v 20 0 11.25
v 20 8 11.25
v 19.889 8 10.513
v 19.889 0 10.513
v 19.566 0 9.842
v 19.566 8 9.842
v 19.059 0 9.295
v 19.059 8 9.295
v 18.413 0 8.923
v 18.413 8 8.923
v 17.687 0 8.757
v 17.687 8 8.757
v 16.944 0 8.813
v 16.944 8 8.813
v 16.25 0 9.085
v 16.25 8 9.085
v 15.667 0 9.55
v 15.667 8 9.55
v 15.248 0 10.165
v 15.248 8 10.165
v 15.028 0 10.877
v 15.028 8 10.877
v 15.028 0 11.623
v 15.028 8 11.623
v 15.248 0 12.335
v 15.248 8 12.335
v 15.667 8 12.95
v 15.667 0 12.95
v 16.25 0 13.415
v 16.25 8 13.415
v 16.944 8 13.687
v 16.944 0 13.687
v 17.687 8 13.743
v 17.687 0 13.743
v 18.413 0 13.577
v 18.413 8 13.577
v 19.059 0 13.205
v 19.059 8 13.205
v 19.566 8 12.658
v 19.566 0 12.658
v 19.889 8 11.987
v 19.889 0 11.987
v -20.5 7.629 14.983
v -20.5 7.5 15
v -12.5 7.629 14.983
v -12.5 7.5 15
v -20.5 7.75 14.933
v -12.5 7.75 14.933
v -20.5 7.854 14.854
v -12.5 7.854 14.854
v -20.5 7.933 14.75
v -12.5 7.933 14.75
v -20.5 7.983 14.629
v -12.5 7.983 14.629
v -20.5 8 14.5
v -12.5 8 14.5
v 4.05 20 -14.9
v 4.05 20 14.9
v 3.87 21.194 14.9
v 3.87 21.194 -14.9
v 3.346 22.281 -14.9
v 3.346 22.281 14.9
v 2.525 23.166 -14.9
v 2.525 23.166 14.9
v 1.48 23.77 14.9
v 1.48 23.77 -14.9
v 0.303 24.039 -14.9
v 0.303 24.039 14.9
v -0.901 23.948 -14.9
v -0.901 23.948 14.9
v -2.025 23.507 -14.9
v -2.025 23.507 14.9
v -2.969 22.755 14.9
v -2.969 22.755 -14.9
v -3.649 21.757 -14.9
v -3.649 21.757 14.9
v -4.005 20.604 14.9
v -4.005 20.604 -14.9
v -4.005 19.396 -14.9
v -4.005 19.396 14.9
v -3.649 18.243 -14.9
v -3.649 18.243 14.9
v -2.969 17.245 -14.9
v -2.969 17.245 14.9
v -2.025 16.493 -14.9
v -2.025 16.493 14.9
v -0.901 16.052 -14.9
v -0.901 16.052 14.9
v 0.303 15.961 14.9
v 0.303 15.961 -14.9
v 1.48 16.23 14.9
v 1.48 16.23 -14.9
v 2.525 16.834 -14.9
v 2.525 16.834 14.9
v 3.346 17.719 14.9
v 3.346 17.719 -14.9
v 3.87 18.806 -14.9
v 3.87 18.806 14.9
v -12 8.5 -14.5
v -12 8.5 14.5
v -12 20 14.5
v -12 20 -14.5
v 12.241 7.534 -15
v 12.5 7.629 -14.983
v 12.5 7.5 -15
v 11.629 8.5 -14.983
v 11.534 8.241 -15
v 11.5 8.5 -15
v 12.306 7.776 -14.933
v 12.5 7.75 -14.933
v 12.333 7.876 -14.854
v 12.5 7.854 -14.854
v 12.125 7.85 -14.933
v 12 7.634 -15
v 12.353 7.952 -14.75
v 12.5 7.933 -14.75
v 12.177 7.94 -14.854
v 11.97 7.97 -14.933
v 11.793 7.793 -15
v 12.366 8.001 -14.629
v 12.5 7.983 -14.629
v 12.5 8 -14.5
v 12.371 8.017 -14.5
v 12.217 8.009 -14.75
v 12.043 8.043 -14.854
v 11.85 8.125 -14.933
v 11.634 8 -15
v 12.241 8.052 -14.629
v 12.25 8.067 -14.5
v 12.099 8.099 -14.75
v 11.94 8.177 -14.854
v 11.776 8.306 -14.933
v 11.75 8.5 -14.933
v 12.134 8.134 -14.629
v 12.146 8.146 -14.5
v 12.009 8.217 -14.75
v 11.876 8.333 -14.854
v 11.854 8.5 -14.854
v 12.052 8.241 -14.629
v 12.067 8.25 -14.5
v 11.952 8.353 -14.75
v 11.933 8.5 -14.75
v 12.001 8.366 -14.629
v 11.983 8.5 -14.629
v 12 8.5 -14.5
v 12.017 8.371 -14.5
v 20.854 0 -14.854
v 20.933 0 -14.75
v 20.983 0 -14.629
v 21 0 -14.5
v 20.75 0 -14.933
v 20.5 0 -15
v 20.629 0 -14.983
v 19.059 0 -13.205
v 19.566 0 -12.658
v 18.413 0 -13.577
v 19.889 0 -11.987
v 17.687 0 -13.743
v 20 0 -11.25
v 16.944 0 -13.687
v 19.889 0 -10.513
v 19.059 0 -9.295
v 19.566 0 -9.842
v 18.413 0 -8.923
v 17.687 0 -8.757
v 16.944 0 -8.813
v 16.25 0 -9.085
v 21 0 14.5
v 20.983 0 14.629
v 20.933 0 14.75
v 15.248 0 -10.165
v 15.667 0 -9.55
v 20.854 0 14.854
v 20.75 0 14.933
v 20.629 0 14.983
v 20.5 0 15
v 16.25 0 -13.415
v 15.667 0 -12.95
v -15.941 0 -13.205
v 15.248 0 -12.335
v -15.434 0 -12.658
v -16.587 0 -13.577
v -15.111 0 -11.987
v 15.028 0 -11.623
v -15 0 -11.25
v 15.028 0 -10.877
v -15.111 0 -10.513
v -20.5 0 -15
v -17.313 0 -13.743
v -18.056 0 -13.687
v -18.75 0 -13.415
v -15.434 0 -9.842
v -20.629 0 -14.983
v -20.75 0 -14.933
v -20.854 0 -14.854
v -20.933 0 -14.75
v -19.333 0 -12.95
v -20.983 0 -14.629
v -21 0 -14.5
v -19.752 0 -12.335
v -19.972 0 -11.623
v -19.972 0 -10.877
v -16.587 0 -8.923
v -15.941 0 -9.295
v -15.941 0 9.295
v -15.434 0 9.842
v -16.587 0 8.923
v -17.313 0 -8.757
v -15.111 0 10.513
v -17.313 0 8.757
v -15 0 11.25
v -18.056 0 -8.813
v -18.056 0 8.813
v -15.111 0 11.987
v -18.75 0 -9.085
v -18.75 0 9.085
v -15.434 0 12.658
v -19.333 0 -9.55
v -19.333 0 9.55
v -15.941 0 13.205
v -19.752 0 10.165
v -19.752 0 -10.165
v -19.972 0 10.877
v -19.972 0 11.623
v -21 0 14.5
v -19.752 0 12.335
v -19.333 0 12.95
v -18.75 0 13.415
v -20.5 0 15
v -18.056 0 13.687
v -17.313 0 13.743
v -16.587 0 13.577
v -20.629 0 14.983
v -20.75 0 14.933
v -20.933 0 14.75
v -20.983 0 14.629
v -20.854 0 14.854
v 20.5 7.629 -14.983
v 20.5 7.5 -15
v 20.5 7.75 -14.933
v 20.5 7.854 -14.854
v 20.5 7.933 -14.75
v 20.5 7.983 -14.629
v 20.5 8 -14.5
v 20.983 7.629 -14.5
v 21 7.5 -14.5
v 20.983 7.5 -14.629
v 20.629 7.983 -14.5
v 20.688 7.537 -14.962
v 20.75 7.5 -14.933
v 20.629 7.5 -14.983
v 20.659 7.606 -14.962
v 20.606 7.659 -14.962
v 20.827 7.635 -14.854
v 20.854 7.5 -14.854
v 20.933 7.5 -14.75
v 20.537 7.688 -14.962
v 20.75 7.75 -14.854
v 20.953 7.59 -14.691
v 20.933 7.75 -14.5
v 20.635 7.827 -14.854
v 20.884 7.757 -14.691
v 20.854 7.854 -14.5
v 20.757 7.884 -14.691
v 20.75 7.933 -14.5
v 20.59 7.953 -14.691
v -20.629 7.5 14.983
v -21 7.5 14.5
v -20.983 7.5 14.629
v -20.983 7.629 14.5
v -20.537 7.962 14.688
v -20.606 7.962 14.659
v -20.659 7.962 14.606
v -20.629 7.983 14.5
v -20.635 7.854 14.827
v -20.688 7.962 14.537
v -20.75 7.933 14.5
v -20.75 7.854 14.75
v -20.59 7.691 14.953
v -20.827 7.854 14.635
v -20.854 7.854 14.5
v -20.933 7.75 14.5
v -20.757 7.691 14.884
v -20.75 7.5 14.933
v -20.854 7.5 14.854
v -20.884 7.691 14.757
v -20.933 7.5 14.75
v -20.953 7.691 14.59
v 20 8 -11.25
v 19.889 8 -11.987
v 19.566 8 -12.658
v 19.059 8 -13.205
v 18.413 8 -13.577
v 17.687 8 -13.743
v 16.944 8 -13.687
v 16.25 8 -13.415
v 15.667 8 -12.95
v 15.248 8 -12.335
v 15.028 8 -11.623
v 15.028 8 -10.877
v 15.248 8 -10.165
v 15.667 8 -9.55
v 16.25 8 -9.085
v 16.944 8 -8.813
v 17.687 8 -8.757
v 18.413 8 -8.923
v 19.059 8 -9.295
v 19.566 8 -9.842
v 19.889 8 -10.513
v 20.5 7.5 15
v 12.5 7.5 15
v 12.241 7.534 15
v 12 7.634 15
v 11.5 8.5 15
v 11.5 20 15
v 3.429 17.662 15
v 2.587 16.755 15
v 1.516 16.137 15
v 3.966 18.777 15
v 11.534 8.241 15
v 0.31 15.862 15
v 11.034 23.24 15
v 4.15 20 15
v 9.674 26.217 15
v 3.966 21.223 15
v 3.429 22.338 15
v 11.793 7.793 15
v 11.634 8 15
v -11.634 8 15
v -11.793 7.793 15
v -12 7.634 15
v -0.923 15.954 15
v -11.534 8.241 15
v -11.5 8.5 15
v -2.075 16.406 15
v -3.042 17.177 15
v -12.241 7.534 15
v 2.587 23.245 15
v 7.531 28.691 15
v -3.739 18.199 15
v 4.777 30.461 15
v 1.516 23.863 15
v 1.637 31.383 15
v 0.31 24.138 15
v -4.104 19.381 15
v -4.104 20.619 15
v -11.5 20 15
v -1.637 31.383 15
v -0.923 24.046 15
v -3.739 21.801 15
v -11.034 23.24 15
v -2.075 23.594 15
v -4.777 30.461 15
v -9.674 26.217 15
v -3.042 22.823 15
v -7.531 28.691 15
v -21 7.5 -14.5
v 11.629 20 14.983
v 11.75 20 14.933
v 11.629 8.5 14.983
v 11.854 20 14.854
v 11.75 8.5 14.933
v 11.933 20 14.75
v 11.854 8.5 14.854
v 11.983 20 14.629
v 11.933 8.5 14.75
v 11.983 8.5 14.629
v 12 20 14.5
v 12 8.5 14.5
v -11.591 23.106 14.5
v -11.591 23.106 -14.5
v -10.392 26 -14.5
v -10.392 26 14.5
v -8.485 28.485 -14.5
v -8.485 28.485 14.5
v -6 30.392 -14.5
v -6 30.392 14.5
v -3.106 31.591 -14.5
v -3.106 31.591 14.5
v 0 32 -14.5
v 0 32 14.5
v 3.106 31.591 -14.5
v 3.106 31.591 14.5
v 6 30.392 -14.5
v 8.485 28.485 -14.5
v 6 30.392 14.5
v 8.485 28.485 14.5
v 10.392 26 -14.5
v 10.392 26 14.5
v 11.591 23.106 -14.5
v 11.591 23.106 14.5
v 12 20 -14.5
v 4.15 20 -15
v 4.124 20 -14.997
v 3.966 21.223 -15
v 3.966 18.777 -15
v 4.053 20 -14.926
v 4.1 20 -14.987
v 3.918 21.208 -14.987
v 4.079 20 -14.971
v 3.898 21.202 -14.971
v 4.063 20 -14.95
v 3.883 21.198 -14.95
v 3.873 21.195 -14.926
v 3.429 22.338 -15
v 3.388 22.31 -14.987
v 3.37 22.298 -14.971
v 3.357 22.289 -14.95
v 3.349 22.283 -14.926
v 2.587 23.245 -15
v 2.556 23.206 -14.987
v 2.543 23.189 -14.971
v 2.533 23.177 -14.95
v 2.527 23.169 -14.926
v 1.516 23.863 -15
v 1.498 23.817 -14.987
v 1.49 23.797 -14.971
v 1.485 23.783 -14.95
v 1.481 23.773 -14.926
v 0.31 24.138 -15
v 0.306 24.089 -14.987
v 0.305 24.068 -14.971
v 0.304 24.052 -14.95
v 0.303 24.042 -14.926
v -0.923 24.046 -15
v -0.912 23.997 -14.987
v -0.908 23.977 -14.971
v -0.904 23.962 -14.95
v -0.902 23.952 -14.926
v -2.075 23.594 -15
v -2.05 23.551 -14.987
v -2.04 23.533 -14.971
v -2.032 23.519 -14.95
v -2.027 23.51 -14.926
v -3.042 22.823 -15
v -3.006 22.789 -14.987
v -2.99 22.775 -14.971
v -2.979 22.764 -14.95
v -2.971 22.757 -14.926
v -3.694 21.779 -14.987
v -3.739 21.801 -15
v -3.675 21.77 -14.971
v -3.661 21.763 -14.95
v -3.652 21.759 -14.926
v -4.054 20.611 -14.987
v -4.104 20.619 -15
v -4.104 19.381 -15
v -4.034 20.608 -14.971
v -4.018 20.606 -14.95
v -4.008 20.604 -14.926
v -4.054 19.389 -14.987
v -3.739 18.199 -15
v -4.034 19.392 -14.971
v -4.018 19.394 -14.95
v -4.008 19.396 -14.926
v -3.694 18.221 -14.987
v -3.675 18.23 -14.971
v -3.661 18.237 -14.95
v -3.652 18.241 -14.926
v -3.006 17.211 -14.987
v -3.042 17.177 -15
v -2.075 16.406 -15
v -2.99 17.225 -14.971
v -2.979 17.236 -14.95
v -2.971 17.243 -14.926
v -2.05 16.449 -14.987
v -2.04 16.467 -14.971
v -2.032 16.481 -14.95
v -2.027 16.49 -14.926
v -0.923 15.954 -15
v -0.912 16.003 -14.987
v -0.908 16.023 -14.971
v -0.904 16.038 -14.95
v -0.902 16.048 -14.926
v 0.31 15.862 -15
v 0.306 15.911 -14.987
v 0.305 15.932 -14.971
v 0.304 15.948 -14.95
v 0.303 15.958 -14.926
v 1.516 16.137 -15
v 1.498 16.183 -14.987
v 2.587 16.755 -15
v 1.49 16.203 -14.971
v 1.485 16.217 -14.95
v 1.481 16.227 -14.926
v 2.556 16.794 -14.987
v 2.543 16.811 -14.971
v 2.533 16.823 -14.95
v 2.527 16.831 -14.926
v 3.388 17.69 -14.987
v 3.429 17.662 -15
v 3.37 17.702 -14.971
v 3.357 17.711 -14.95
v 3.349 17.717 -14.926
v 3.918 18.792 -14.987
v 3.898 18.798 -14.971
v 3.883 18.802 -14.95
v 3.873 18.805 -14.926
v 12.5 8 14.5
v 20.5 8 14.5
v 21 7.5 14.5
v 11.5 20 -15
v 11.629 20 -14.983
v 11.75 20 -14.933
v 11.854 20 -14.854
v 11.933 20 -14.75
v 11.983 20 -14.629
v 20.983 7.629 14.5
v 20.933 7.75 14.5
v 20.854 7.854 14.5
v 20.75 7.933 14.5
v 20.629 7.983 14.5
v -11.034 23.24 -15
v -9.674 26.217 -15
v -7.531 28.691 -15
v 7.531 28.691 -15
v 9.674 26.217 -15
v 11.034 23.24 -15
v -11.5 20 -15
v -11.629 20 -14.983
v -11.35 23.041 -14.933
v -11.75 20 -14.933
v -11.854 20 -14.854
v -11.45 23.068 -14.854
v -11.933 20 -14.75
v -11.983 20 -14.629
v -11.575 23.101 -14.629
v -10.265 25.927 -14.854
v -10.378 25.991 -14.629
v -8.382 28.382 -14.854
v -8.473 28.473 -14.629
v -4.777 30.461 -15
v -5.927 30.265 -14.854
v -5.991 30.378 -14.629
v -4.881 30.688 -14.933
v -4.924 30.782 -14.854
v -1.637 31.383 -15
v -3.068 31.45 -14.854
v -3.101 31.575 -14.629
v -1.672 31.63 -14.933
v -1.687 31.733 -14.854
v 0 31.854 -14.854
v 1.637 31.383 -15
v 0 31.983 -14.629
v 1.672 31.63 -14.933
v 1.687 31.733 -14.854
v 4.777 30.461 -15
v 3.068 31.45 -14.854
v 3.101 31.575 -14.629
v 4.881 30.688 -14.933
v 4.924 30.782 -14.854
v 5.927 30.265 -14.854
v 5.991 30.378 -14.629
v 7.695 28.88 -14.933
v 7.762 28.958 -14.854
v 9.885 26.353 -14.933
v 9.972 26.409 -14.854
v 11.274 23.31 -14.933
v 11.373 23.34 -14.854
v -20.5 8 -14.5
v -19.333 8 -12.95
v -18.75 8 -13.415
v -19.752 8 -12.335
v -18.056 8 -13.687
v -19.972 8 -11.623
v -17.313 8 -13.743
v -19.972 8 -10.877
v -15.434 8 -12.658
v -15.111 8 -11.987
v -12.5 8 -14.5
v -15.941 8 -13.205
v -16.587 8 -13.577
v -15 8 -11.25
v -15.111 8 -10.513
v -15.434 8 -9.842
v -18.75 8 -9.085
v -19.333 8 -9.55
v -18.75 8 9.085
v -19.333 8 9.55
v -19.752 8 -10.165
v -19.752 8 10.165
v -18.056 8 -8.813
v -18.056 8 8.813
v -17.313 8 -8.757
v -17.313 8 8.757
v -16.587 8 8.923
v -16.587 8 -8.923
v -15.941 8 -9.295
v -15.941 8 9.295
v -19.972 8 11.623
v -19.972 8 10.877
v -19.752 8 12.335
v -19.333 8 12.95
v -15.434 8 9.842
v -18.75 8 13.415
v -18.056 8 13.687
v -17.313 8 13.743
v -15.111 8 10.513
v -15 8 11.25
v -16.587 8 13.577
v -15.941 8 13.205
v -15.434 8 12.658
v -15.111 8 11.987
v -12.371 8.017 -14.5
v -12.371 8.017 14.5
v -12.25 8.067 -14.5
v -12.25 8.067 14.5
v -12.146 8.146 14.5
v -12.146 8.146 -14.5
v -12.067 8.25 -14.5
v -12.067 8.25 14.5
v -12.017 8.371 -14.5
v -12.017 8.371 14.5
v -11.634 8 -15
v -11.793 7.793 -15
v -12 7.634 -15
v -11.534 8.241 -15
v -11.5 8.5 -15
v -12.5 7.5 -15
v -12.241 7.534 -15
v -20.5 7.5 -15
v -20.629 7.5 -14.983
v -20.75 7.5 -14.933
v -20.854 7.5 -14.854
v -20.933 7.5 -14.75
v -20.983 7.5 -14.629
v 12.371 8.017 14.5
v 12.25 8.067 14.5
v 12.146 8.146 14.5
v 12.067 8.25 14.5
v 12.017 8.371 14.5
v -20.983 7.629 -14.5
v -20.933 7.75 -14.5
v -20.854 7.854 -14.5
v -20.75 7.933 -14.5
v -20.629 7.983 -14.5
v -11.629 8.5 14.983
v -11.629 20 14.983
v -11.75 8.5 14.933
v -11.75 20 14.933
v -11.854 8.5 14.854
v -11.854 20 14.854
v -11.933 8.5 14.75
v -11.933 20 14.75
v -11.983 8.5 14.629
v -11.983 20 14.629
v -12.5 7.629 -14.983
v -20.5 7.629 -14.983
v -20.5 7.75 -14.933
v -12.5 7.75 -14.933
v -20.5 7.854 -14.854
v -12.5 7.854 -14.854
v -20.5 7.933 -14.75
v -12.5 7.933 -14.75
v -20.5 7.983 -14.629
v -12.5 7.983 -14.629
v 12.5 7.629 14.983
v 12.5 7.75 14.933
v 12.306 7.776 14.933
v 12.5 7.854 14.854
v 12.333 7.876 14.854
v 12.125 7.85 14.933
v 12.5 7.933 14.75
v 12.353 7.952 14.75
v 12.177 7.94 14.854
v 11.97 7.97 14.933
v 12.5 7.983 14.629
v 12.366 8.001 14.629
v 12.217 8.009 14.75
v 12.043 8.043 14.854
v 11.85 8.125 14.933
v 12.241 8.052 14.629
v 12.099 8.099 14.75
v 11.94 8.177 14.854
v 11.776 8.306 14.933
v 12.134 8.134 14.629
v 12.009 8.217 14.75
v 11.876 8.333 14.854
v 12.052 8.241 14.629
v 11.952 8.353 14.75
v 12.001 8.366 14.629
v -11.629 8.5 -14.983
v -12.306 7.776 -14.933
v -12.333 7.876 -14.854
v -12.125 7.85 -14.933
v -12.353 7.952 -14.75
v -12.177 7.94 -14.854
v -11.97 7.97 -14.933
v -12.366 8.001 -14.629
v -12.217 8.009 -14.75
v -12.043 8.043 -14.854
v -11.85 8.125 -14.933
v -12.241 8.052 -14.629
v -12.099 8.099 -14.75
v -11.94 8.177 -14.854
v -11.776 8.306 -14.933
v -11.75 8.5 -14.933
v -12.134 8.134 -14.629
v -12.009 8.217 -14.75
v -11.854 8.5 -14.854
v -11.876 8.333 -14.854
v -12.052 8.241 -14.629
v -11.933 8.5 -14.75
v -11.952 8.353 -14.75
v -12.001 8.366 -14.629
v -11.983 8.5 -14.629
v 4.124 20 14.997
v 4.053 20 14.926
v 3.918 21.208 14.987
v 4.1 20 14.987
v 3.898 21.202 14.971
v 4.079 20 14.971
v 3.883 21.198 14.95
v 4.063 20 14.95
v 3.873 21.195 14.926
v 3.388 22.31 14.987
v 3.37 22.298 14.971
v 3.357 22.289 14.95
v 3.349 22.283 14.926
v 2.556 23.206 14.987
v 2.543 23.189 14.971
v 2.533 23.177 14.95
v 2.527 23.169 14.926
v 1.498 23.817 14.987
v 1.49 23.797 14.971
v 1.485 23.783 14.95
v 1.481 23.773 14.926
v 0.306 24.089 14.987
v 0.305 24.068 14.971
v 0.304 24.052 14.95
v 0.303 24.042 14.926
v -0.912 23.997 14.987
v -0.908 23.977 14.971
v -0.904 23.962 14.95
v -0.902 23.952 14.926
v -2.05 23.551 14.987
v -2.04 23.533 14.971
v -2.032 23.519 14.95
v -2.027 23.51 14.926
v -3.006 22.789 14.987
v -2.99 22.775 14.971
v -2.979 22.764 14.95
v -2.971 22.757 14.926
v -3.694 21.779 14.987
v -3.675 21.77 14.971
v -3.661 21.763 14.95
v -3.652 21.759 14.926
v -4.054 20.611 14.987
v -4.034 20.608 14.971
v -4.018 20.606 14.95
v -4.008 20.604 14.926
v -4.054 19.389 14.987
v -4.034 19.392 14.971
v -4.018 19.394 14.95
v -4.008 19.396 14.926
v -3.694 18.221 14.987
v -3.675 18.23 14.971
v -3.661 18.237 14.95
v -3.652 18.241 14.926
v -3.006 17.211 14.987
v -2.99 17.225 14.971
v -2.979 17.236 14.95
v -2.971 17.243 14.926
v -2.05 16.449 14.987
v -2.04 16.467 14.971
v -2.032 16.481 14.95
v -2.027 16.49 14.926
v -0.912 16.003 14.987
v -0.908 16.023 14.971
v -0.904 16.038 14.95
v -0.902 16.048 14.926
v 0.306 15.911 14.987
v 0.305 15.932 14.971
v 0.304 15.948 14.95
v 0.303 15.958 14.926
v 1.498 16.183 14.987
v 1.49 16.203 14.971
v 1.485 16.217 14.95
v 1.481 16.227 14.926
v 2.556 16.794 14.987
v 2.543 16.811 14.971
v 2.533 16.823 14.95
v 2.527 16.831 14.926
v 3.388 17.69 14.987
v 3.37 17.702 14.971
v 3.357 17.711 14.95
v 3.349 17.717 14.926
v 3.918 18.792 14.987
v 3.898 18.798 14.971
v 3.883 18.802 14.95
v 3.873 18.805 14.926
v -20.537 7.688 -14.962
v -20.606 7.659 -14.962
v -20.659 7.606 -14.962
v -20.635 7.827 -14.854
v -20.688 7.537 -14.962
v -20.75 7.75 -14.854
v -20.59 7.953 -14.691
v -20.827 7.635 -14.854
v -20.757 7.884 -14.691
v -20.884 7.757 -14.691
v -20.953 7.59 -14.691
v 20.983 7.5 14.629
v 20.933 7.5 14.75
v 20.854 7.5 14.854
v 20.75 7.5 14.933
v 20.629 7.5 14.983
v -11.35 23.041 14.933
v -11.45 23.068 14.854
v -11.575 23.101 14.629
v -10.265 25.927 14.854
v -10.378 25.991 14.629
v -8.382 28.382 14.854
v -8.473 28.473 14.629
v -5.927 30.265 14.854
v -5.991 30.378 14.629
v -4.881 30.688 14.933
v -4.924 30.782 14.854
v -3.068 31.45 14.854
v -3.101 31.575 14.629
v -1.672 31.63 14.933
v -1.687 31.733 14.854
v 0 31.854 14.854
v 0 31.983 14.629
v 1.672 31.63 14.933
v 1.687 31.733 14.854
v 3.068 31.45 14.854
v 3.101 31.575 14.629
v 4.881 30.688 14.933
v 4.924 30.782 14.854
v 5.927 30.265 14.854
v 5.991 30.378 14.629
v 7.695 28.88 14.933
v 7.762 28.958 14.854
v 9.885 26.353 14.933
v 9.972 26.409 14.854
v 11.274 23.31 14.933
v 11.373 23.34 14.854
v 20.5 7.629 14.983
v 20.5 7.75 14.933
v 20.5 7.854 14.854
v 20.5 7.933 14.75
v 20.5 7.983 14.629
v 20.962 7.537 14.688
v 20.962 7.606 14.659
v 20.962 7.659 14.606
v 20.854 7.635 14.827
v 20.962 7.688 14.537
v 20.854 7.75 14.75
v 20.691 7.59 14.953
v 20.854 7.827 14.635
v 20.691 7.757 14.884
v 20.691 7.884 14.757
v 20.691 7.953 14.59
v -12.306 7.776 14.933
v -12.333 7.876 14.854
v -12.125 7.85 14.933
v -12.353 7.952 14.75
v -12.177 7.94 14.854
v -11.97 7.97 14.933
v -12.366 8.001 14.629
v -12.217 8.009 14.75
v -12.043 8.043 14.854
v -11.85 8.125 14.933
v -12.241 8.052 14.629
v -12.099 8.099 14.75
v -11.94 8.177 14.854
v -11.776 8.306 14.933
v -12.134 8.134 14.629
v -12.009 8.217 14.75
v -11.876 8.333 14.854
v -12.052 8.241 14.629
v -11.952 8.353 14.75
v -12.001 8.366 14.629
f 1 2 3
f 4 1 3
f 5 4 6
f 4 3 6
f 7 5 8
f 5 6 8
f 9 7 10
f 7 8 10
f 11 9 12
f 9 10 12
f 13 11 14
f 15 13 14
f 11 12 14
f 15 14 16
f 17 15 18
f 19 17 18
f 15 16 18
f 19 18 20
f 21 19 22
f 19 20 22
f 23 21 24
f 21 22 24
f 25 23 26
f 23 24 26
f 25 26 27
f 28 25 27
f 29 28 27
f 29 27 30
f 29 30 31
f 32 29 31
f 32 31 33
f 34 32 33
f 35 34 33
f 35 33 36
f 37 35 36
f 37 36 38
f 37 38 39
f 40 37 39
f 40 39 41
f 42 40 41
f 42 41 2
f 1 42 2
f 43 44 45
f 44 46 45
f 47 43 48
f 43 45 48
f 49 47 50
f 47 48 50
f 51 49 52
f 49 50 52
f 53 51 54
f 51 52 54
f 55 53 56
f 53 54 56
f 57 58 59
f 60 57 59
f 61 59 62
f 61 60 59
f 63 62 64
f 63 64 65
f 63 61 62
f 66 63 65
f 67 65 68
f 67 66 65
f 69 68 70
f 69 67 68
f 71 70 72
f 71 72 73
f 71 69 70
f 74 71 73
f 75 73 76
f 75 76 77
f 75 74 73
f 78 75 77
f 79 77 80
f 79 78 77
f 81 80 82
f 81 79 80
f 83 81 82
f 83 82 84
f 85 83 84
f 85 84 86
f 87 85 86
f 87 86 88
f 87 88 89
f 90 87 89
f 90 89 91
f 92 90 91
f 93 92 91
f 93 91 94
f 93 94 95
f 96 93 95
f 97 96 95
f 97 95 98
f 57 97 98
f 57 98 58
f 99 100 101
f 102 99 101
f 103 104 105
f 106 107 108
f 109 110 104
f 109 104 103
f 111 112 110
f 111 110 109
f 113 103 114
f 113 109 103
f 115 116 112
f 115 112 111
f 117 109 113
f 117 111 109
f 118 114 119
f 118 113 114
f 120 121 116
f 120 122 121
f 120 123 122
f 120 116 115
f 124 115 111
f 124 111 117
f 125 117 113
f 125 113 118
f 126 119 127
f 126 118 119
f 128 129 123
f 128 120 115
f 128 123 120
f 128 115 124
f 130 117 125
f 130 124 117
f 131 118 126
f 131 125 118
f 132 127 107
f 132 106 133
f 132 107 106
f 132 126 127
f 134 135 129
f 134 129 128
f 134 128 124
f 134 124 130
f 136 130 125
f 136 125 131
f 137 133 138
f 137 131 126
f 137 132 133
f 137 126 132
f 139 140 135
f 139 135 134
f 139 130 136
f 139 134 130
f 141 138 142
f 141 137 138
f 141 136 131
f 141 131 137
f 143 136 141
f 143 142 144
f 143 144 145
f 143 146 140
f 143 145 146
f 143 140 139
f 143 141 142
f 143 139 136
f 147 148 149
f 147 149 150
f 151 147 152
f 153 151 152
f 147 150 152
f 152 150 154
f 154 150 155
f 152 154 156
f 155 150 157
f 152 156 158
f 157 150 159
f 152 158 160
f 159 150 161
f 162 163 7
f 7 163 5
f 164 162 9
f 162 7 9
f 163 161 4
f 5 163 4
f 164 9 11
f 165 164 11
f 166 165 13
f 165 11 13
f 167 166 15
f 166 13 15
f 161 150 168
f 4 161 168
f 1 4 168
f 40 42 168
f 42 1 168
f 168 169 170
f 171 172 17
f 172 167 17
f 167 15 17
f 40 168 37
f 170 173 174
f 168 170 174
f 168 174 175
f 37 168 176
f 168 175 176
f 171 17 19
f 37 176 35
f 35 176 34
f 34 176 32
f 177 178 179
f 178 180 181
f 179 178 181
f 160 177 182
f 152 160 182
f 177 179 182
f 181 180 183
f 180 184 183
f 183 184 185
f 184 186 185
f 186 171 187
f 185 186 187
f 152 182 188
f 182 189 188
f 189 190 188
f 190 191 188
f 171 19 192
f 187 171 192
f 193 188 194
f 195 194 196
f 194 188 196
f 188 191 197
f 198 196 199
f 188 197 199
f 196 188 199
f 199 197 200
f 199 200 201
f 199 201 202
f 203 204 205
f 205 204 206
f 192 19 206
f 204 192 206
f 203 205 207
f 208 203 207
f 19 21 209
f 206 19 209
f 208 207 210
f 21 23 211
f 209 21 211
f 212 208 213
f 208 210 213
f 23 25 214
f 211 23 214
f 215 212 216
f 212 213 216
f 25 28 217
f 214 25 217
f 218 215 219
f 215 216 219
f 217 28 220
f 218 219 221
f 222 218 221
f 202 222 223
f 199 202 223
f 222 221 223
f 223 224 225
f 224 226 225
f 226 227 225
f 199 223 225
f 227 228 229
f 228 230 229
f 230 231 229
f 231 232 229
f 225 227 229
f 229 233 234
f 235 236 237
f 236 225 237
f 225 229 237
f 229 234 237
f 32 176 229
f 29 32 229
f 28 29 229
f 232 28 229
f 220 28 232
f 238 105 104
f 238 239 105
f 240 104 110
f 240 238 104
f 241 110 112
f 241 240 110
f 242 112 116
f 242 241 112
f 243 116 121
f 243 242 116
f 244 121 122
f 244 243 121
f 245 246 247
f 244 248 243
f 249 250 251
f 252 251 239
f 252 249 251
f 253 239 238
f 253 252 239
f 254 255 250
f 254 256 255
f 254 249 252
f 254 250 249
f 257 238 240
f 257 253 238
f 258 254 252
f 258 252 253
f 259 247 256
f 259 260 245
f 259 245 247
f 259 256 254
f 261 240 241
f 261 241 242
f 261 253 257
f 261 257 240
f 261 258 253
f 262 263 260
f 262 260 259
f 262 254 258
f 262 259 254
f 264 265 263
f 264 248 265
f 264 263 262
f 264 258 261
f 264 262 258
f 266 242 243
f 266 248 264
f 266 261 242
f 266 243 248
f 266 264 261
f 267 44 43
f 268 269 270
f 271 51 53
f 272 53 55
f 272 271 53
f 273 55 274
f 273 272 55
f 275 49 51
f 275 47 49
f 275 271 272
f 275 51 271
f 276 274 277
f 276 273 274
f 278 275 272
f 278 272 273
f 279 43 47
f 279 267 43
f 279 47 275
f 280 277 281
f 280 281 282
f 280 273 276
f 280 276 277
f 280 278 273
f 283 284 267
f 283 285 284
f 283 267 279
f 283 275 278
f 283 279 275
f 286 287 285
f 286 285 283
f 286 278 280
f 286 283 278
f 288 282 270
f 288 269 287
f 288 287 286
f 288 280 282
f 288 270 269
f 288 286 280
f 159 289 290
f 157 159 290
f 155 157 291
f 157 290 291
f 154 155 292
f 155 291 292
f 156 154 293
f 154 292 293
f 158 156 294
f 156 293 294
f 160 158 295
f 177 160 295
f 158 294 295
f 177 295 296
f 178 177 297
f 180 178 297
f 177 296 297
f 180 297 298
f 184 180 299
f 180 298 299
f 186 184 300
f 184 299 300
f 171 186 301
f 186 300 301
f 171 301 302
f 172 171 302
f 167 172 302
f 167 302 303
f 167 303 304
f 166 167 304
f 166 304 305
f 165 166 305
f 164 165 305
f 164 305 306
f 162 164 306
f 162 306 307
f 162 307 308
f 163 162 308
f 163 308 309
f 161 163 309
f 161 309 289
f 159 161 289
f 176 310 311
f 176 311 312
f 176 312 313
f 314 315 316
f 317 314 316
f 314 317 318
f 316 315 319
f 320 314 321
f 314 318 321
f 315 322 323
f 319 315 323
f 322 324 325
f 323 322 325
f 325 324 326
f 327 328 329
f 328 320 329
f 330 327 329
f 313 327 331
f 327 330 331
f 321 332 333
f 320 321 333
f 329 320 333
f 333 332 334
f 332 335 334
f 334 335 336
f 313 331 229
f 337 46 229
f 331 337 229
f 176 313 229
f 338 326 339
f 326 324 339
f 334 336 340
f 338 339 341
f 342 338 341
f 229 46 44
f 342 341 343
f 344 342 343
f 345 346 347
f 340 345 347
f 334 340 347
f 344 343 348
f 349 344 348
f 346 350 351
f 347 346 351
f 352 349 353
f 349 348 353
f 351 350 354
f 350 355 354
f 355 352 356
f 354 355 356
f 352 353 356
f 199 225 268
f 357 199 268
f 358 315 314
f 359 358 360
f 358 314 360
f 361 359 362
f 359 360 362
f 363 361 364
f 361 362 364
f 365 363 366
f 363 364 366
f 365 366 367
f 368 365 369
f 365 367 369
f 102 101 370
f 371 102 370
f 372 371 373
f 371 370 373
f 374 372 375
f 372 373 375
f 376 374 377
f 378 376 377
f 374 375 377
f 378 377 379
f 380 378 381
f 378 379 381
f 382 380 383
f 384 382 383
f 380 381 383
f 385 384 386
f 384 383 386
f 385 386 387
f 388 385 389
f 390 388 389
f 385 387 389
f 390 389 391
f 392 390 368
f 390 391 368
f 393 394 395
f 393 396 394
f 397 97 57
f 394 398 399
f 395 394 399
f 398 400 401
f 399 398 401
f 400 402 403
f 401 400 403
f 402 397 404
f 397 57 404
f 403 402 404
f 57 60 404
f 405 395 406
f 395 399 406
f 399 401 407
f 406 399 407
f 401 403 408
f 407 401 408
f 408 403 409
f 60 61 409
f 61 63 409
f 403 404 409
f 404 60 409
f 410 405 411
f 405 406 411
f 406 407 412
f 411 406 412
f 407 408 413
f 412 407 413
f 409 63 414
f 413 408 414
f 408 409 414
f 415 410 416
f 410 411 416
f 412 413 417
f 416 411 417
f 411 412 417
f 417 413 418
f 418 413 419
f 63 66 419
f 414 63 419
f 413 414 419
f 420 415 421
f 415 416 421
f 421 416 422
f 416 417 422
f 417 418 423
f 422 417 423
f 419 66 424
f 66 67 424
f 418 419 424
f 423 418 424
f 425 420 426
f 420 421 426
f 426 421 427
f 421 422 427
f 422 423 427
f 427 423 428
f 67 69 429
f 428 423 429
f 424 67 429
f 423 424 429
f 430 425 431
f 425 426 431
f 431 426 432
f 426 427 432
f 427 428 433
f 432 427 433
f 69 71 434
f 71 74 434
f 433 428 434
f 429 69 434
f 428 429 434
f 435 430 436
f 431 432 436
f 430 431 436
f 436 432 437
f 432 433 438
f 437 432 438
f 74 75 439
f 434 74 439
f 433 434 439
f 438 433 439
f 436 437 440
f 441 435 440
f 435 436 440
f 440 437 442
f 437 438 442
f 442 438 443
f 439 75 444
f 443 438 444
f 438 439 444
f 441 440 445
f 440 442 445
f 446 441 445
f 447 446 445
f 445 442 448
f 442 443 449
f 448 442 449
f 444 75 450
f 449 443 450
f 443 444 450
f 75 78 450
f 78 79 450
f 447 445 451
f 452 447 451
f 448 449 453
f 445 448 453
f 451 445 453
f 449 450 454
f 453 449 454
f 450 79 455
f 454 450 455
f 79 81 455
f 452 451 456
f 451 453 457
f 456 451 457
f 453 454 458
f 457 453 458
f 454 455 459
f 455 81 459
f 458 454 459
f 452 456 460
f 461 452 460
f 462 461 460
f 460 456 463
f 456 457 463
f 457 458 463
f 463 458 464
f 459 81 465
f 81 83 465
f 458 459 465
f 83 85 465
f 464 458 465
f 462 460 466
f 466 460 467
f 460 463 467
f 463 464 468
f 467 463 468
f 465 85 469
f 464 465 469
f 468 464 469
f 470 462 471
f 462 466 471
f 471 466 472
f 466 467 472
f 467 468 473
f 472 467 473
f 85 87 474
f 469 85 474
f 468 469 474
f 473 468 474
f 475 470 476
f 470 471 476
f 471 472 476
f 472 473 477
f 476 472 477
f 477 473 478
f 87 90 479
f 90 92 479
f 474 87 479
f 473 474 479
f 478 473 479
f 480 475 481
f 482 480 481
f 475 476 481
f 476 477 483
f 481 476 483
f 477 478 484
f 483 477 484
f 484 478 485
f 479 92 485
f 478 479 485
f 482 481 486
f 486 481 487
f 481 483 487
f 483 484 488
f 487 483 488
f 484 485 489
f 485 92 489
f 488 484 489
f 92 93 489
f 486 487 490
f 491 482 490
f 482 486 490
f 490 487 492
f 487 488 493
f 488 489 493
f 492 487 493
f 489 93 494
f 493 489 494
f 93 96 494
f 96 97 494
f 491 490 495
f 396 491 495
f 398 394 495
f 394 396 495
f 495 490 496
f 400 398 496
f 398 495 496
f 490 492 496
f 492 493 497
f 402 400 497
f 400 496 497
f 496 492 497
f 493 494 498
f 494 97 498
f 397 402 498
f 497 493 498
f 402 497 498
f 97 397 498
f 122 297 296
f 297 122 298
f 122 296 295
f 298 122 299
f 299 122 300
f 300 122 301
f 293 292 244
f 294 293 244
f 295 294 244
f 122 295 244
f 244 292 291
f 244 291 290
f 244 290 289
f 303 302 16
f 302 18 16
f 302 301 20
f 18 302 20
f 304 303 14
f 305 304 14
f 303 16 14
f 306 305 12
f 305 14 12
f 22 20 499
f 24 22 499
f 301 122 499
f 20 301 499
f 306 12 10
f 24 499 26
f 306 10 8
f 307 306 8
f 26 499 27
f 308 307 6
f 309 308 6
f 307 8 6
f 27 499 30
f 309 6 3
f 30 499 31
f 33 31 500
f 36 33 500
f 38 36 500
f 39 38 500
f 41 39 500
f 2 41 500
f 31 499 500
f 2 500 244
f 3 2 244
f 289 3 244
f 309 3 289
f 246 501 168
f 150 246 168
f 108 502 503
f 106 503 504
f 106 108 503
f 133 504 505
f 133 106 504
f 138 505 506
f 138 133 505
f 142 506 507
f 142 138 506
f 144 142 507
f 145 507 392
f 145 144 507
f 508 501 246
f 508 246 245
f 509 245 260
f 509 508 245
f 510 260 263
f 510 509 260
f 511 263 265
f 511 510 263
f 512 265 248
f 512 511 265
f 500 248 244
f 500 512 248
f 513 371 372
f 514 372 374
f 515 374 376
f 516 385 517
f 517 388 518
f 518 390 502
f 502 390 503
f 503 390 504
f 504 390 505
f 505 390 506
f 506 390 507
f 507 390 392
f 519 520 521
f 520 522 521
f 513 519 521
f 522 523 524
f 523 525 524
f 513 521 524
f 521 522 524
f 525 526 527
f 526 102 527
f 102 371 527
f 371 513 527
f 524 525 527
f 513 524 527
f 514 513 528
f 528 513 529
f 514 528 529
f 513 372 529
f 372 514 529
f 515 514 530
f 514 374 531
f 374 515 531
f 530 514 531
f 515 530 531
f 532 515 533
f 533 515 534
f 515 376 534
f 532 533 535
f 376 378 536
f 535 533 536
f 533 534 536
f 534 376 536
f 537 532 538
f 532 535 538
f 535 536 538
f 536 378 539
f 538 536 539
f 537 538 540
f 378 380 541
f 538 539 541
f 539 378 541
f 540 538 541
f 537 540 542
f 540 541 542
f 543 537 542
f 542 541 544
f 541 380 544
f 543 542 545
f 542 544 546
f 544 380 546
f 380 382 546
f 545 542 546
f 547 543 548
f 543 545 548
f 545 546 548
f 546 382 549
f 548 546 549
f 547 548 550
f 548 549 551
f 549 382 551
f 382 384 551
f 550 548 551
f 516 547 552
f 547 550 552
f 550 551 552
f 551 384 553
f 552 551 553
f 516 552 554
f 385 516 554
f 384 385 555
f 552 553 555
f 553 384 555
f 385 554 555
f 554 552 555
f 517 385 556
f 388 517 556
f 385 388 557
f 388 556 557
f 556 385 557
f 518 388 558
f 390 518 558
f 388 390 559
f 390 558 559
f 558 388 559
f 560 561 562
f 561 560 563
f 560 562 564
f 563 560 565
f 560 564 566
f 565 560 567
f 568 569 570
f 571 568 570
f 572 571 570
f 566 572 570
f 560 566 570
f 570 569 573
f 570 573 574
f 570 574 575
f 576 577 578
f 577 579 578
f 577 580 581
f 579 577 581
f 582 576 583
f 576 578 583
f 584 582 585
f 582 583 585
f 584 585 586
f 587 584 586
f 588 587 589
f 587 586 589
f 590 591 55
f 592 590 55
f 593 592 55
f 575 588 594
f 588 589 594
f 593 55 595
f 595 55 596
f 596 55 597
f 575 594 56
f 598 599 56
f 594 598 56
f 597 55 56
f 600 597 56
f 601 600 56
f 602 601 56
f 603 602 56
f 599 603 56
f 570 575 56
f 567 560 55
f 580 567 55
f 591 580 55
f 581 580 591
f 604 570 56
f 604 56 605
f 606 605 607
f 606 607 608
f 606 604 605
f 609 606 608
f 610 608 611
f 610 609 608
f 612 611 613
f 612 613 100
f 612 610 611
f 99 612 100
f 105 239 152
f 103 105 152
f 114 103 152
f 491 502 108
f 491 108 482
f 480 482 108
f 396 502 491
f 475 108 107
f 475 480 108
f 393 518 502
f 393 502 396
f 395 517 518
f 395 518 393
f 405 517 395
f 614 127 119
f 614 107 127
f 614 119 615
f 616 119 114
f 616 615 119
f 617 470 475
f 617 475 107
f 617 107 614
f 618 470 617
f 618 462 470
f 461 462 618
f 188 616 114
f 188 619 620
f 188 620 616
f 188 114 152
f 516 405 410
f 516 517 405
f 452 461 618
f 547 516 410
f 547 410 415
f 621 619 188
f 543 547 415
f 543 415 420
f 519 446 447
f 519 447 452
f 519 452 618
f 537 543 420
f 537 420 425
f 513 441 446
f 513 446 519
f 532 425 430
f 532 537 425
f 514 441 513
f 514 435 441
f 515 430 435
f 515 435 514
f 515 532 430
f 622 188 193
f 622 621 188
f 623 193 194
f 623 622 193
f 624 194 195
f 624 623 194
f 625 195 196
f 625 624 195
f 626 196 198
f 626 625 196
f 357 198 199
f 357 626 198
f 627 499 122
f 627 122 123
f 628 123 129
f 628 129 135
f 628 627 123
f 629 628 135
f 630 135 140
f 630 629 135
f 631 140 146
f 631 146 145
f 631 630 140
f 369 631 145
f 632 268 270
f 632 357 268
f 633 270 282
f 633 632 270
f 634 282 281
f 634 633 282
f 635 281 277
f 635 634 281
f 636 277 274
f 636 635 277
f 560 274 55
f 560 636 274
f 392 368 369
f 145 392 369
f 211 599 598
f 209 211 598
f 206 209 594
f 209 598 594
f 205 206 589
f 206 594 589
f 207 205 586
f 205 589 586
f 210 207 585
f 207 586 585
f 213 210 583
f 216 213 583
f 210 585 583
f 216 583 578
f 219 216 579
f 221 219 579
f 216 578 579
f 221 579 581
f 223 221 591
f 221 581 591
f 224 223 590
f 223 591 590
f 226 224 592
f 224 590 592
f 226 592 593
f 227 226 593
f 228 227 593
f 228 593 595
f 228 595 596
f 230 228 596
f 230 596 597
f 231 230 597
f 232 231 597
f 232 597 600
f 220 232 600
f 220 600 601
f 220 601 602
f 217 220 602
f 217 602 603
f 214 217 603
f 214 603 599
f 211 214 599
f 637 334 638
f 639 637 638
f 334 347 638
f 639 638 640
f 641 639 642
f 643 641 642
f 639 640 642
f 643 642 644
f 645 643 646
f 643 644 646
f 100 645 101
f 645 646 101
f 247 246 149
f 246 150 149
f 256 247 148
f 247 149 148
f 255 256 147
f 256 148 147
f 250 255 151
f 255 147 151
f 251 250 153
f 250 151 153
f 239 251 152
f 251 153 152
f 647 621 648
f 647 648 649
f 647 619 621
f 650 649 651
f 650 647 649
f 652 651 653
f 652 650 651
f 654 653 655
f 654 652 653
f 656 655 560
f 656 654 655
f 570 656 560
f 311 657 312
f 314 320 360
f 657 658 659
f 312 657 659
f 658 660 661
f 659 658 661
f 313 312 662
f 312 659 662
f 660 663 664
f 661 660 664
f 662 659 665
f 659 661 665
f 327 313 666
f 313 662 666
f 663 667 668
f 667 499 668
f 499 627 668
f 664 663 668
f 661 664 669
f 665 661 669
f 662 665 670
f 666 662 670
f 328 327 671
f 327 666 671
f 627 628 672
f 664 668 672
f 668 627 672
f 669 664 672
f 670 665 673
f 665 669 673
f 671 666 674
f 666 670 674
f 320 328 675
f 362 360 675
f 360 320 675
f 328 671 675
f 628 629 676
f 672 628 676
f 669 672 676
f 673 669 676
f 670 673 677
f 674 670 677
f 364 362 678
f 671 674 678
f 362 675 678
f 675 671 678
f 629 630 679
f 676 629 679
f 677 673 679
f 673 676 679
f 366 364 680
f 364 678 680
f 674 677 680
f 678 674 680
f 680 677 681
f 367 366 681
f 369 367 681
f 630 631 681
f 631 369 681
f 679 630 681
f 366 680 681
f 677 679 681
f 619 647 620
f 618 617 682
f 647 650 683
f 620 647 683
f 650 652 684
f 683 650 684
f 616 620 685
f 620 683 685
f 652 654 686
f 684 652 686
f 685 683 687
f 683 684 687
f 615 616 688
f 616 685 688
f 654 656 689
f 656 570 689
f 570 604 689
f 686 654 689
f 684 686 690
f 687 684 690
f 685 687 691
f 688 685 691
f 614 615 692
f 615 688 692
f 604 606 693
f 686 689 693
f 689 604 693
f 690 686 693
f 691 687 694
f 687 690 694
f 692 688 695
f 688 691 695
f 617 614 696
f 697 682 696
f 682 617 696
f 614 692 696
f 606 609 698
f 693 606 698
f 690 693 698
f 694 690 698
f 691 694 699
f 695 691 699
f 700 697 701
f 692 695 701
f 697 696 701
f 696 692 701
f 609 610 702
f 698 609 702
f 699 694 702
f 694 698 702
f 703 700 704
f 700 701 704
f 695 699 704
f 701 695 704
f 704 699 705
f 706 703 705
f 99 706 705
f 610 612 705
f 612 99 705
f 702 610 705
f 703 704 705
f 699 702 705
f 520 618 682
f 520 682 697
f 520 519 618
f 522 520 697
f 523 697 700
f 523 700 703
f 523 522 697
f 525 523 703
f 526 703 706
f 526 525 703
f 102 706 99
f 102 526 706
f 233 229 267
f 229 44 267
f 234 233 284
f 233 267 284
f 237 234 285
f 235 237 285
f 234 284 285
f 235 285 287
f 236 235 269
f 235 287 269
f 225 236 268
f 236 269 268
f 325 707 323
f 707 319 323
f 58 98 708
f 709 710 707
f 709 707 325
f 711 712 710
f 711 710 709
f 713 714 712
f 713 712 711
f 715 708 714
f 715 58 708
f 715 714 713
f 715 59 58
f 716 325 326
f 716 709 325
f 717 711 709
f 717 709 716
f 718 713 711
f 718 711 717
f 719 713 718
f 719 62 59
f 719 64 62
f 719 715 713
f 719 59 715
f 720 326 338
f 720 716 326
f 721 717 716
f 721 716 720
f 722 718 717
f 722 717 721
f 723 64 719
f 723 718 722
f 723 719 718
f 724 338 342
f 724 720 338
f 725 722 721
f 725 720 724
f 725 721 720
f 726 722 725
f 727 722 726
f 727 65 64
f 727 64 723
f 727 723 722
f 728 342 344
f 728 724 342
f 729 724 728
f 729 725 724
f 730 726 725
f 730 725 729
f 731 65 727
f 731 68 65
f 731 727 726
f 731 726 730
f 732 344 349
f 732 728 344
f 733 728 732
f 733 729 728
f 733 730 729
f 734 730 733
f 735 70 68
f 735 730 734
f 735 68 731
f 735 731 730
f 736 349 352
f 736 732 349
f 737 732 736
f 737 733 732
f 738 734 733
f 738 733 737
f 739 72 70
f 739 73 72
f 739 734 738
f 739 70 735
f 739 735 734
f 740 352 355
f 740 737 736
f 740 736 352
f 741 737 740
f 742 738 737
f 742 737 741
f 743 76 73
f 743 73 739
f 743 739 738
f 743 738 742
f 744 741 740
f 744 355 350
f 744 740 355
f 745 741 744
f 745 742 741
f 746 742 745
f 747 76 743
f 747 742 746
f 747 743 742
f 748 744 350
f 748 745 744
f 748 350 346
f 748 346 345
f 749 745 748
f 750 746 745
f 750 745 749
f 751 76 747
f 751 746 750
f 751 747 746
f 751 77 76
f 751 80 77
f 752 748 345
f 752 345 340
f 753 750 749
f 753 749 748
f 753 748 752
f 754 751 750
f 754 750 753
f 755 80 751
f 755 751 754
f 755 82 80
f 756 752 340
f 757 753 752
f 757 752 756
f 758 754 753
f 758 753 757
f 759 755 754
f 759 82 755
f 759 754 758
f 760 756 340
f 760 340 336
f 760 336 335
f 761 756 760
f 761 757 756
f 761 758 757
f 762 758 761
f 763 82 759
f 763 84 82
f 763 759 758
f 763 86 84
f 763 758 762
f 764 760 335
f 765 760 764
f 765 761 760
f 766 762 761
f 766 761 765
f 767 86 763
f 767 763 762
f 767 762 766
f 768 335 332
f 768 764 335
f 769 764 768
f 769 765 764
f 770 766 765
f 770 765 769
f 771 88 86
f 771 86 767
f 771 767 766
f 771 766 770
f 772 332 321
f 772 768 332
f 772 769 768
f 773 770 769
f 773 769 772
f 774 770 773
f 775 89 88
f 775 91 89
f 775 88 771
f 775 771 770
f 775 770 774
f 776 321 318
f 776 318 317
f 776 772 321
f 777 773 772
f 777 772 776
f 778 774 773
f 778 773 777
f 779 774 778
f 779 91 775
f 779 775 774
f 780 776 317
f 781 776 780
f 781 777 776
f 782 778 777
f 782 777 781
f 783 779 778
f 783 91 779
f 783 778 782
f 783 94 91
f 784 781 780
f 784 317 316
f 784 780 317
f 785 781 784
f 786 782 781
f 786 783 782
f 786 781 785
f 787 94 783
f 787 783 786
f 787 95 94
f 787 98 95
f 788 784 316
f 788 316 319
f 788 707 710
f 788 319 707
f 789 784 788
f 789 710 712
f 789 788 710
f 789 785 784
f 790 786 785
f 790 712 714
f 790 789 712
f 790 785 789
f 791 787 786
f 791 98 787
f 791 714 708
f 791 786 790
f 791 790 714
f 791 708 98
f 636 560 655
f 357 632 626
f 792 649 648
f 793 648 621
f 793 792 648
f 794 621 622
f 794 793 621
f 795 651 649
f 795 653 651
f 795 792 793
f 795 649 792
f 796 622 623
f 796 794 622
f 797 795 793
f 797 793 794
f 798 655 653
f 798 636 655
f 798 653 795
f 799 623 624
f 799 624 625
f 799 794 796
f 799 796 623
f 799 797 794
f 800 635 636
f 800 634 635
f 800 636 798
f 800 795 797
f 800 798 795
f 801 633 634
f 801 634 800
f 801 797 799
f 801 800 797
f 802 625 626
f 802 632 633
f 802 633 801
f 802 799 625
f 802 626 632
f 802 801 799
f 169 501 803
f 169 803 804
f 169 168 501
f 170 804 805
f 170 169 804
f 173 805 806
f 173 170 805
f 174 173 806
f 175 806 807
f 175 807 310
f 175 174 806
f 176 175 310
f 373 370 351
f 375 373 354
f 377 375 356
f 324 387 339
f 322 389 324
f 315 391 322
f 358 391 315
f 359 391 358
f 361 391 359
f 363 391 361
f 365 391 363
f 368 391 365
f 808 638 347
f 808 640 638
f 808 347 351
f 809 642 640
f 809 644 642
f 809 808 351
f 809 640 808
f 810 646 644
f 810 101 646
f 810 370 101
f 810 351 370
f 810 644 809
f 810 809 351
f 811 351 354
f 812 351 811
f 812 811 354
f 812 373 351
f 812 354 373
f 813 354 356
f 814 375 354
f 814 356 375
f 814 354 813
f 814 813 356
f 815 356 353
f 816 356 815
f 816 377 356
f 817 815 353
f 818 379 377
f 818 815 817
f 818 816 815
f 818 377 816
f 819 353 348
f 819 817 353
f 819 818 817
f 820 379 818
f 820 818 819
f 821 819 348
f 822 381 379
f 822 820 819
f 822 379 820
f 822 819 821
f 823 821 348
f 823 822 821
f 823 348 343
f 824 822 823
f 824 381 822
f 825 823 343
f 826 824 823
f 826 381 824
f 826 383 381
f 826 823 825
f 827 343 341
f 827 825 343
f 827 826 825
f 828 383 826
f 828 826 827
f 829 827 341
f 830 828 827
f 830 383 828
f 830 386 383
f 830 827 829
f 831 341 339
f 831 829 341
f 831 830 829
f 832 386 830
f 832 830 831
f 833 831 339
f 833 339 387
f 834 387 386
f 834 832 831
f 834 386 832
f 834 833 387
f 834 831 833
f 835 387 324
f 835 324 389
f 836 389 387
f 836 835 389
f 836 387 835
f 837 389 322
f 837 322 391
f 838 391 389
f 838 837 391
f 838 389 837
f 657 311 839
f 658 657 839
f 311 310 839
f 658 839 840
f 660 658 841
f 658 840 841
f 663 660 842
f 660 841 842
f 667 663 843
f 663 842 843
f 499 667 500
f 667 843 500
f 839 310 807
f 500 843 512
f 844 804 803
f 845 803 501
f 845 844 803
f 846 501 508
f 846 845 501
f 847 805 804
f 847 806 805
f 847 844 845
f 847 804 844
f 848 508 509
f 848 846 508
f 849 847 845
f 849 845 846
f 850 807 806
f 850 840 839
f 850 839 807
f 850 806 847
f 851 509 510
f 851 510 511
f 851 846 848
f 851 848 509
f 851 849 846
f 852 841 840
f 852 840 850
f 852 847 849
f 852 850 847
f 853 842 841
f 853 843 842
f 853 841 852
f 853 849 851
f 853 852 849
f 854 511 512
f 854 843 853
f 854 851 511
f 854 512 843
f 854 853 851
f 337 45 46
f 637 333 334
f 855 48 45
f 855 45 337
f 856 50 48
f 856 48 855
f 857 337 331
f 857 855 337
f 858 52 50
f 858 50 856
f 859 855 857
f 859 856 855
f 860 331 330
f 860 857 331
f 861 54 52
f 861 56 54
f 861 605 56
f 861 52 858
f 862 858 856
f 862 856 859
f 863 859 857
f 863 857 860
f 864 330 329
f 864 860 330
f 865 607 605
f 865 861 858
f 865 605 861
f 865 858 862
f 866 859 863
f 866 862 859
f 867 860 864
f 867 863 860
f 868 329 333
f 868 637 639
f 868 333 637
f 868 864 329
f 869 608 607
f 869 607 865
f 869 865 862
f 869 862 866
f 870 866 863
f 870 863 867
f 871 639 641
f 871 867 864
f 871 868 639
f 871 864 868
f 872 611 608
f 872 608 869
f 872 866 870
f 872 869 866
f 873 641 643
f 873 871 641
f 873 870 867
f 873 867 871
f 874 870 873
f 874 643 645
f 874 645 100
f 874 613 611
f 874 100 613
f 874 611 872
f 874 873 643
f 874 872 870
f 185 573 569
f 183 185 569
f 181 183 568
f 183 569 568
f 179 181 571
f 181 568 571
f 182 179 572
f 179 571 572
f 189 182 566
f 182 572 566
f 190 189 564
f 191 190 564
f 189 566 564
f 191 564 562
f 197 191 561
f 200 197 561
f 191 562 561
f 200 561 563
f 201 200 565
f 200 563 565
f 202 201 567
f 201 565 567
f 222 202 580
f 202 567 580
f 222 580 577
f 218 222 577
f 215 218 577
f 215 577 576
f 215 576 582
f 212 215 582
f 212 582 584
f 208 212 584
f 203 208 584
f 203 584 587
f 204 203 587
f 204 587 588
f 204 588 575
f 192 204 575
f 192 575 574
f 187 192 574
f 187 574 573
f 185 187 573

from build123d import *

# Parameters (mm, degrees)
CROQUIS1_R              = 4.05
SALIENTE_EXTRUIR1_DEPTH = 15
CORTAR_EXTRUIR1_REACH   = 10
CROQUIS2_R              = 2.5
REDONDEO1_R             = 0.5
REDONDEO2_R             = 0.1


with BuildPart() as part:
    # Croquis1 → Saliente-Extruir1 (new body, symmetric)
    with BuildSketch(Plane.XY):
        with BuildLine():
            Line((21, 0), (-21, 0))
            Line((-21, 0), (-21, 8))
            Line((-21, 8), (-12, 8))
            Line((-12, 8), (-12, 20))
            ThreePointArc((-12, 20), (0, 32), (12, 20))
            Line((12, 20), (12, 8))
            Line((12, 8), (21, 8))
            Line((21, 8), (21, 0))
        make_face()
        with Locations((0, 20)):
            Circle(CROQUIS1_R, mode=Mode.SUBTRACT)
    extrude(amount=SALIENTE_EXTRUIR1_DEPTH, both=True)

    # Croquis2 → Cortar-Extruir1 (cut, up to next)
    with BuildSketch(Plane(origin=(0, 8, 0), x_dir=(1, 0, 0), z_dir=(0, 1, 0)), mode=Mode.PRIVATE) as cortar_extruir1_sk1:
        with Locations((-17.5, 11.25)):
            Circle(CROQUIS2_R)
    cortar_extruir1_tool1 = extrude(cortar_extruir1_sk1.sketch, amount=-CORTAR_EXTRUIR1_REACH, mode=Mode.PRIVATE) & part.part
    add(cortar_extruir1_tool1.solids().sort_by_distance((-17.5, 8, -11.25))[0], mode=Mode.SUBTRACT)
    # Croquis2 → Cortar-Extruir1 (cut, up to next)
    with BuildSketch(Plane(origin=(0, 8, 0), x_dir=(1, 0, 0), z_dir=(0, 1, 0)), mode=Mode.PRIVATE) as cortar_extruir1_sk2:
        with Locations((17.5, 11.25)):
            Circle(CROQUIS2_R)
    cortar_extruir1_tool2 = extrude(cortar_extruir1_sk2.sketch, amount=-CORTAR_EXTRUIR1_REACH, mode=Mode.PRIVATE) & part.part
    add(cortar_extruir1_tool2.solids().sort_by_distance((17.5, 8, -11.25))[0], mode=Mode.SUBTRACT)
    # Croquis2 → Cortar-Extruir1 (cut, up to next)
    with BuildSketch(Plane(origin=(0, 8, 0), x_dir=(1, 0, 0), z_dir=(0, 1, 0)), mode=Mode.PRIVATE) as cortar_extruir1_sk3:
        with Locations((-17.5, -11.25)):
            Circle(CROQUIS2_R)
    cortar_extruir1_tool3 = extrude(cortar_extruir1_sk3.sketch, amount=-CORTAR_EXTRUIR1_REACH, mode=Mode.PRIVATE) & part.part
    add(cortar_extruir1_tool3.solids().sort_by_distance((-17.5, 8, 11.25))[0], mode=Mode.SUBTRACT)
    # Croquis2 → Cortar-Extruir1 (cut, up to next)
    with BuildSketch(Plane(origin=(0, 8, 0), x_dir=(1, 0, 0), z_dir=(0, 1, 0)), mode=Mode.PRIVATE) as cortar_extruir1_sk4:
        with Locations((17.5, -11.25)):
            Circle(CROQUIS2_R)
    cortar_extruir1_tool4 = extrude(cortar_extruir1_sk4.sketch, amount=-CORTAR_EXTRUIR1_REACH, mode=Mode.PRIVATE) & part.part
    add(cortar_extruir1_tool4.solids().sort_by_distance((17.5, 8, 11.25))[0], mode=Mode.SUBTRACT)

    # Redondeo1
    redondeo1_edges = [part.edges().sort_by_distance(p)[0] for p in [
        (12, 14, -15),
        (16.5, 8, 15),
        (21, 4, 15),
        (-21, 4, 15),
        (-16.5, 8, 15),
        (-12, 14, 15),
        (0, 32, 15),
        (12, 14, 15),
        (0, 32, -15),
        (12, 8, 0),
        (21, 8, 0),
        (-21, 8, 0),
        (-12, 8, 0),
        (-12, 14, -15),
        (-16.5, 8, -15),
        (-21, 4, -15),
        (21, 4, -15),
        (16.5, 8, -15),
    ]]
    fillet(redondeo1_edges, radius=REDONDEO1_R)

    # Redondeo2
    redondeo2_edges = [part.edges().sort_by_distance(p)[0] for p in [
        (-4.05, 20, 15),
        (-4.05, 20, -15),
    ]]
    fillet(redondeo2_edges, radius=REDONDEO2_R)


solid = part.part
